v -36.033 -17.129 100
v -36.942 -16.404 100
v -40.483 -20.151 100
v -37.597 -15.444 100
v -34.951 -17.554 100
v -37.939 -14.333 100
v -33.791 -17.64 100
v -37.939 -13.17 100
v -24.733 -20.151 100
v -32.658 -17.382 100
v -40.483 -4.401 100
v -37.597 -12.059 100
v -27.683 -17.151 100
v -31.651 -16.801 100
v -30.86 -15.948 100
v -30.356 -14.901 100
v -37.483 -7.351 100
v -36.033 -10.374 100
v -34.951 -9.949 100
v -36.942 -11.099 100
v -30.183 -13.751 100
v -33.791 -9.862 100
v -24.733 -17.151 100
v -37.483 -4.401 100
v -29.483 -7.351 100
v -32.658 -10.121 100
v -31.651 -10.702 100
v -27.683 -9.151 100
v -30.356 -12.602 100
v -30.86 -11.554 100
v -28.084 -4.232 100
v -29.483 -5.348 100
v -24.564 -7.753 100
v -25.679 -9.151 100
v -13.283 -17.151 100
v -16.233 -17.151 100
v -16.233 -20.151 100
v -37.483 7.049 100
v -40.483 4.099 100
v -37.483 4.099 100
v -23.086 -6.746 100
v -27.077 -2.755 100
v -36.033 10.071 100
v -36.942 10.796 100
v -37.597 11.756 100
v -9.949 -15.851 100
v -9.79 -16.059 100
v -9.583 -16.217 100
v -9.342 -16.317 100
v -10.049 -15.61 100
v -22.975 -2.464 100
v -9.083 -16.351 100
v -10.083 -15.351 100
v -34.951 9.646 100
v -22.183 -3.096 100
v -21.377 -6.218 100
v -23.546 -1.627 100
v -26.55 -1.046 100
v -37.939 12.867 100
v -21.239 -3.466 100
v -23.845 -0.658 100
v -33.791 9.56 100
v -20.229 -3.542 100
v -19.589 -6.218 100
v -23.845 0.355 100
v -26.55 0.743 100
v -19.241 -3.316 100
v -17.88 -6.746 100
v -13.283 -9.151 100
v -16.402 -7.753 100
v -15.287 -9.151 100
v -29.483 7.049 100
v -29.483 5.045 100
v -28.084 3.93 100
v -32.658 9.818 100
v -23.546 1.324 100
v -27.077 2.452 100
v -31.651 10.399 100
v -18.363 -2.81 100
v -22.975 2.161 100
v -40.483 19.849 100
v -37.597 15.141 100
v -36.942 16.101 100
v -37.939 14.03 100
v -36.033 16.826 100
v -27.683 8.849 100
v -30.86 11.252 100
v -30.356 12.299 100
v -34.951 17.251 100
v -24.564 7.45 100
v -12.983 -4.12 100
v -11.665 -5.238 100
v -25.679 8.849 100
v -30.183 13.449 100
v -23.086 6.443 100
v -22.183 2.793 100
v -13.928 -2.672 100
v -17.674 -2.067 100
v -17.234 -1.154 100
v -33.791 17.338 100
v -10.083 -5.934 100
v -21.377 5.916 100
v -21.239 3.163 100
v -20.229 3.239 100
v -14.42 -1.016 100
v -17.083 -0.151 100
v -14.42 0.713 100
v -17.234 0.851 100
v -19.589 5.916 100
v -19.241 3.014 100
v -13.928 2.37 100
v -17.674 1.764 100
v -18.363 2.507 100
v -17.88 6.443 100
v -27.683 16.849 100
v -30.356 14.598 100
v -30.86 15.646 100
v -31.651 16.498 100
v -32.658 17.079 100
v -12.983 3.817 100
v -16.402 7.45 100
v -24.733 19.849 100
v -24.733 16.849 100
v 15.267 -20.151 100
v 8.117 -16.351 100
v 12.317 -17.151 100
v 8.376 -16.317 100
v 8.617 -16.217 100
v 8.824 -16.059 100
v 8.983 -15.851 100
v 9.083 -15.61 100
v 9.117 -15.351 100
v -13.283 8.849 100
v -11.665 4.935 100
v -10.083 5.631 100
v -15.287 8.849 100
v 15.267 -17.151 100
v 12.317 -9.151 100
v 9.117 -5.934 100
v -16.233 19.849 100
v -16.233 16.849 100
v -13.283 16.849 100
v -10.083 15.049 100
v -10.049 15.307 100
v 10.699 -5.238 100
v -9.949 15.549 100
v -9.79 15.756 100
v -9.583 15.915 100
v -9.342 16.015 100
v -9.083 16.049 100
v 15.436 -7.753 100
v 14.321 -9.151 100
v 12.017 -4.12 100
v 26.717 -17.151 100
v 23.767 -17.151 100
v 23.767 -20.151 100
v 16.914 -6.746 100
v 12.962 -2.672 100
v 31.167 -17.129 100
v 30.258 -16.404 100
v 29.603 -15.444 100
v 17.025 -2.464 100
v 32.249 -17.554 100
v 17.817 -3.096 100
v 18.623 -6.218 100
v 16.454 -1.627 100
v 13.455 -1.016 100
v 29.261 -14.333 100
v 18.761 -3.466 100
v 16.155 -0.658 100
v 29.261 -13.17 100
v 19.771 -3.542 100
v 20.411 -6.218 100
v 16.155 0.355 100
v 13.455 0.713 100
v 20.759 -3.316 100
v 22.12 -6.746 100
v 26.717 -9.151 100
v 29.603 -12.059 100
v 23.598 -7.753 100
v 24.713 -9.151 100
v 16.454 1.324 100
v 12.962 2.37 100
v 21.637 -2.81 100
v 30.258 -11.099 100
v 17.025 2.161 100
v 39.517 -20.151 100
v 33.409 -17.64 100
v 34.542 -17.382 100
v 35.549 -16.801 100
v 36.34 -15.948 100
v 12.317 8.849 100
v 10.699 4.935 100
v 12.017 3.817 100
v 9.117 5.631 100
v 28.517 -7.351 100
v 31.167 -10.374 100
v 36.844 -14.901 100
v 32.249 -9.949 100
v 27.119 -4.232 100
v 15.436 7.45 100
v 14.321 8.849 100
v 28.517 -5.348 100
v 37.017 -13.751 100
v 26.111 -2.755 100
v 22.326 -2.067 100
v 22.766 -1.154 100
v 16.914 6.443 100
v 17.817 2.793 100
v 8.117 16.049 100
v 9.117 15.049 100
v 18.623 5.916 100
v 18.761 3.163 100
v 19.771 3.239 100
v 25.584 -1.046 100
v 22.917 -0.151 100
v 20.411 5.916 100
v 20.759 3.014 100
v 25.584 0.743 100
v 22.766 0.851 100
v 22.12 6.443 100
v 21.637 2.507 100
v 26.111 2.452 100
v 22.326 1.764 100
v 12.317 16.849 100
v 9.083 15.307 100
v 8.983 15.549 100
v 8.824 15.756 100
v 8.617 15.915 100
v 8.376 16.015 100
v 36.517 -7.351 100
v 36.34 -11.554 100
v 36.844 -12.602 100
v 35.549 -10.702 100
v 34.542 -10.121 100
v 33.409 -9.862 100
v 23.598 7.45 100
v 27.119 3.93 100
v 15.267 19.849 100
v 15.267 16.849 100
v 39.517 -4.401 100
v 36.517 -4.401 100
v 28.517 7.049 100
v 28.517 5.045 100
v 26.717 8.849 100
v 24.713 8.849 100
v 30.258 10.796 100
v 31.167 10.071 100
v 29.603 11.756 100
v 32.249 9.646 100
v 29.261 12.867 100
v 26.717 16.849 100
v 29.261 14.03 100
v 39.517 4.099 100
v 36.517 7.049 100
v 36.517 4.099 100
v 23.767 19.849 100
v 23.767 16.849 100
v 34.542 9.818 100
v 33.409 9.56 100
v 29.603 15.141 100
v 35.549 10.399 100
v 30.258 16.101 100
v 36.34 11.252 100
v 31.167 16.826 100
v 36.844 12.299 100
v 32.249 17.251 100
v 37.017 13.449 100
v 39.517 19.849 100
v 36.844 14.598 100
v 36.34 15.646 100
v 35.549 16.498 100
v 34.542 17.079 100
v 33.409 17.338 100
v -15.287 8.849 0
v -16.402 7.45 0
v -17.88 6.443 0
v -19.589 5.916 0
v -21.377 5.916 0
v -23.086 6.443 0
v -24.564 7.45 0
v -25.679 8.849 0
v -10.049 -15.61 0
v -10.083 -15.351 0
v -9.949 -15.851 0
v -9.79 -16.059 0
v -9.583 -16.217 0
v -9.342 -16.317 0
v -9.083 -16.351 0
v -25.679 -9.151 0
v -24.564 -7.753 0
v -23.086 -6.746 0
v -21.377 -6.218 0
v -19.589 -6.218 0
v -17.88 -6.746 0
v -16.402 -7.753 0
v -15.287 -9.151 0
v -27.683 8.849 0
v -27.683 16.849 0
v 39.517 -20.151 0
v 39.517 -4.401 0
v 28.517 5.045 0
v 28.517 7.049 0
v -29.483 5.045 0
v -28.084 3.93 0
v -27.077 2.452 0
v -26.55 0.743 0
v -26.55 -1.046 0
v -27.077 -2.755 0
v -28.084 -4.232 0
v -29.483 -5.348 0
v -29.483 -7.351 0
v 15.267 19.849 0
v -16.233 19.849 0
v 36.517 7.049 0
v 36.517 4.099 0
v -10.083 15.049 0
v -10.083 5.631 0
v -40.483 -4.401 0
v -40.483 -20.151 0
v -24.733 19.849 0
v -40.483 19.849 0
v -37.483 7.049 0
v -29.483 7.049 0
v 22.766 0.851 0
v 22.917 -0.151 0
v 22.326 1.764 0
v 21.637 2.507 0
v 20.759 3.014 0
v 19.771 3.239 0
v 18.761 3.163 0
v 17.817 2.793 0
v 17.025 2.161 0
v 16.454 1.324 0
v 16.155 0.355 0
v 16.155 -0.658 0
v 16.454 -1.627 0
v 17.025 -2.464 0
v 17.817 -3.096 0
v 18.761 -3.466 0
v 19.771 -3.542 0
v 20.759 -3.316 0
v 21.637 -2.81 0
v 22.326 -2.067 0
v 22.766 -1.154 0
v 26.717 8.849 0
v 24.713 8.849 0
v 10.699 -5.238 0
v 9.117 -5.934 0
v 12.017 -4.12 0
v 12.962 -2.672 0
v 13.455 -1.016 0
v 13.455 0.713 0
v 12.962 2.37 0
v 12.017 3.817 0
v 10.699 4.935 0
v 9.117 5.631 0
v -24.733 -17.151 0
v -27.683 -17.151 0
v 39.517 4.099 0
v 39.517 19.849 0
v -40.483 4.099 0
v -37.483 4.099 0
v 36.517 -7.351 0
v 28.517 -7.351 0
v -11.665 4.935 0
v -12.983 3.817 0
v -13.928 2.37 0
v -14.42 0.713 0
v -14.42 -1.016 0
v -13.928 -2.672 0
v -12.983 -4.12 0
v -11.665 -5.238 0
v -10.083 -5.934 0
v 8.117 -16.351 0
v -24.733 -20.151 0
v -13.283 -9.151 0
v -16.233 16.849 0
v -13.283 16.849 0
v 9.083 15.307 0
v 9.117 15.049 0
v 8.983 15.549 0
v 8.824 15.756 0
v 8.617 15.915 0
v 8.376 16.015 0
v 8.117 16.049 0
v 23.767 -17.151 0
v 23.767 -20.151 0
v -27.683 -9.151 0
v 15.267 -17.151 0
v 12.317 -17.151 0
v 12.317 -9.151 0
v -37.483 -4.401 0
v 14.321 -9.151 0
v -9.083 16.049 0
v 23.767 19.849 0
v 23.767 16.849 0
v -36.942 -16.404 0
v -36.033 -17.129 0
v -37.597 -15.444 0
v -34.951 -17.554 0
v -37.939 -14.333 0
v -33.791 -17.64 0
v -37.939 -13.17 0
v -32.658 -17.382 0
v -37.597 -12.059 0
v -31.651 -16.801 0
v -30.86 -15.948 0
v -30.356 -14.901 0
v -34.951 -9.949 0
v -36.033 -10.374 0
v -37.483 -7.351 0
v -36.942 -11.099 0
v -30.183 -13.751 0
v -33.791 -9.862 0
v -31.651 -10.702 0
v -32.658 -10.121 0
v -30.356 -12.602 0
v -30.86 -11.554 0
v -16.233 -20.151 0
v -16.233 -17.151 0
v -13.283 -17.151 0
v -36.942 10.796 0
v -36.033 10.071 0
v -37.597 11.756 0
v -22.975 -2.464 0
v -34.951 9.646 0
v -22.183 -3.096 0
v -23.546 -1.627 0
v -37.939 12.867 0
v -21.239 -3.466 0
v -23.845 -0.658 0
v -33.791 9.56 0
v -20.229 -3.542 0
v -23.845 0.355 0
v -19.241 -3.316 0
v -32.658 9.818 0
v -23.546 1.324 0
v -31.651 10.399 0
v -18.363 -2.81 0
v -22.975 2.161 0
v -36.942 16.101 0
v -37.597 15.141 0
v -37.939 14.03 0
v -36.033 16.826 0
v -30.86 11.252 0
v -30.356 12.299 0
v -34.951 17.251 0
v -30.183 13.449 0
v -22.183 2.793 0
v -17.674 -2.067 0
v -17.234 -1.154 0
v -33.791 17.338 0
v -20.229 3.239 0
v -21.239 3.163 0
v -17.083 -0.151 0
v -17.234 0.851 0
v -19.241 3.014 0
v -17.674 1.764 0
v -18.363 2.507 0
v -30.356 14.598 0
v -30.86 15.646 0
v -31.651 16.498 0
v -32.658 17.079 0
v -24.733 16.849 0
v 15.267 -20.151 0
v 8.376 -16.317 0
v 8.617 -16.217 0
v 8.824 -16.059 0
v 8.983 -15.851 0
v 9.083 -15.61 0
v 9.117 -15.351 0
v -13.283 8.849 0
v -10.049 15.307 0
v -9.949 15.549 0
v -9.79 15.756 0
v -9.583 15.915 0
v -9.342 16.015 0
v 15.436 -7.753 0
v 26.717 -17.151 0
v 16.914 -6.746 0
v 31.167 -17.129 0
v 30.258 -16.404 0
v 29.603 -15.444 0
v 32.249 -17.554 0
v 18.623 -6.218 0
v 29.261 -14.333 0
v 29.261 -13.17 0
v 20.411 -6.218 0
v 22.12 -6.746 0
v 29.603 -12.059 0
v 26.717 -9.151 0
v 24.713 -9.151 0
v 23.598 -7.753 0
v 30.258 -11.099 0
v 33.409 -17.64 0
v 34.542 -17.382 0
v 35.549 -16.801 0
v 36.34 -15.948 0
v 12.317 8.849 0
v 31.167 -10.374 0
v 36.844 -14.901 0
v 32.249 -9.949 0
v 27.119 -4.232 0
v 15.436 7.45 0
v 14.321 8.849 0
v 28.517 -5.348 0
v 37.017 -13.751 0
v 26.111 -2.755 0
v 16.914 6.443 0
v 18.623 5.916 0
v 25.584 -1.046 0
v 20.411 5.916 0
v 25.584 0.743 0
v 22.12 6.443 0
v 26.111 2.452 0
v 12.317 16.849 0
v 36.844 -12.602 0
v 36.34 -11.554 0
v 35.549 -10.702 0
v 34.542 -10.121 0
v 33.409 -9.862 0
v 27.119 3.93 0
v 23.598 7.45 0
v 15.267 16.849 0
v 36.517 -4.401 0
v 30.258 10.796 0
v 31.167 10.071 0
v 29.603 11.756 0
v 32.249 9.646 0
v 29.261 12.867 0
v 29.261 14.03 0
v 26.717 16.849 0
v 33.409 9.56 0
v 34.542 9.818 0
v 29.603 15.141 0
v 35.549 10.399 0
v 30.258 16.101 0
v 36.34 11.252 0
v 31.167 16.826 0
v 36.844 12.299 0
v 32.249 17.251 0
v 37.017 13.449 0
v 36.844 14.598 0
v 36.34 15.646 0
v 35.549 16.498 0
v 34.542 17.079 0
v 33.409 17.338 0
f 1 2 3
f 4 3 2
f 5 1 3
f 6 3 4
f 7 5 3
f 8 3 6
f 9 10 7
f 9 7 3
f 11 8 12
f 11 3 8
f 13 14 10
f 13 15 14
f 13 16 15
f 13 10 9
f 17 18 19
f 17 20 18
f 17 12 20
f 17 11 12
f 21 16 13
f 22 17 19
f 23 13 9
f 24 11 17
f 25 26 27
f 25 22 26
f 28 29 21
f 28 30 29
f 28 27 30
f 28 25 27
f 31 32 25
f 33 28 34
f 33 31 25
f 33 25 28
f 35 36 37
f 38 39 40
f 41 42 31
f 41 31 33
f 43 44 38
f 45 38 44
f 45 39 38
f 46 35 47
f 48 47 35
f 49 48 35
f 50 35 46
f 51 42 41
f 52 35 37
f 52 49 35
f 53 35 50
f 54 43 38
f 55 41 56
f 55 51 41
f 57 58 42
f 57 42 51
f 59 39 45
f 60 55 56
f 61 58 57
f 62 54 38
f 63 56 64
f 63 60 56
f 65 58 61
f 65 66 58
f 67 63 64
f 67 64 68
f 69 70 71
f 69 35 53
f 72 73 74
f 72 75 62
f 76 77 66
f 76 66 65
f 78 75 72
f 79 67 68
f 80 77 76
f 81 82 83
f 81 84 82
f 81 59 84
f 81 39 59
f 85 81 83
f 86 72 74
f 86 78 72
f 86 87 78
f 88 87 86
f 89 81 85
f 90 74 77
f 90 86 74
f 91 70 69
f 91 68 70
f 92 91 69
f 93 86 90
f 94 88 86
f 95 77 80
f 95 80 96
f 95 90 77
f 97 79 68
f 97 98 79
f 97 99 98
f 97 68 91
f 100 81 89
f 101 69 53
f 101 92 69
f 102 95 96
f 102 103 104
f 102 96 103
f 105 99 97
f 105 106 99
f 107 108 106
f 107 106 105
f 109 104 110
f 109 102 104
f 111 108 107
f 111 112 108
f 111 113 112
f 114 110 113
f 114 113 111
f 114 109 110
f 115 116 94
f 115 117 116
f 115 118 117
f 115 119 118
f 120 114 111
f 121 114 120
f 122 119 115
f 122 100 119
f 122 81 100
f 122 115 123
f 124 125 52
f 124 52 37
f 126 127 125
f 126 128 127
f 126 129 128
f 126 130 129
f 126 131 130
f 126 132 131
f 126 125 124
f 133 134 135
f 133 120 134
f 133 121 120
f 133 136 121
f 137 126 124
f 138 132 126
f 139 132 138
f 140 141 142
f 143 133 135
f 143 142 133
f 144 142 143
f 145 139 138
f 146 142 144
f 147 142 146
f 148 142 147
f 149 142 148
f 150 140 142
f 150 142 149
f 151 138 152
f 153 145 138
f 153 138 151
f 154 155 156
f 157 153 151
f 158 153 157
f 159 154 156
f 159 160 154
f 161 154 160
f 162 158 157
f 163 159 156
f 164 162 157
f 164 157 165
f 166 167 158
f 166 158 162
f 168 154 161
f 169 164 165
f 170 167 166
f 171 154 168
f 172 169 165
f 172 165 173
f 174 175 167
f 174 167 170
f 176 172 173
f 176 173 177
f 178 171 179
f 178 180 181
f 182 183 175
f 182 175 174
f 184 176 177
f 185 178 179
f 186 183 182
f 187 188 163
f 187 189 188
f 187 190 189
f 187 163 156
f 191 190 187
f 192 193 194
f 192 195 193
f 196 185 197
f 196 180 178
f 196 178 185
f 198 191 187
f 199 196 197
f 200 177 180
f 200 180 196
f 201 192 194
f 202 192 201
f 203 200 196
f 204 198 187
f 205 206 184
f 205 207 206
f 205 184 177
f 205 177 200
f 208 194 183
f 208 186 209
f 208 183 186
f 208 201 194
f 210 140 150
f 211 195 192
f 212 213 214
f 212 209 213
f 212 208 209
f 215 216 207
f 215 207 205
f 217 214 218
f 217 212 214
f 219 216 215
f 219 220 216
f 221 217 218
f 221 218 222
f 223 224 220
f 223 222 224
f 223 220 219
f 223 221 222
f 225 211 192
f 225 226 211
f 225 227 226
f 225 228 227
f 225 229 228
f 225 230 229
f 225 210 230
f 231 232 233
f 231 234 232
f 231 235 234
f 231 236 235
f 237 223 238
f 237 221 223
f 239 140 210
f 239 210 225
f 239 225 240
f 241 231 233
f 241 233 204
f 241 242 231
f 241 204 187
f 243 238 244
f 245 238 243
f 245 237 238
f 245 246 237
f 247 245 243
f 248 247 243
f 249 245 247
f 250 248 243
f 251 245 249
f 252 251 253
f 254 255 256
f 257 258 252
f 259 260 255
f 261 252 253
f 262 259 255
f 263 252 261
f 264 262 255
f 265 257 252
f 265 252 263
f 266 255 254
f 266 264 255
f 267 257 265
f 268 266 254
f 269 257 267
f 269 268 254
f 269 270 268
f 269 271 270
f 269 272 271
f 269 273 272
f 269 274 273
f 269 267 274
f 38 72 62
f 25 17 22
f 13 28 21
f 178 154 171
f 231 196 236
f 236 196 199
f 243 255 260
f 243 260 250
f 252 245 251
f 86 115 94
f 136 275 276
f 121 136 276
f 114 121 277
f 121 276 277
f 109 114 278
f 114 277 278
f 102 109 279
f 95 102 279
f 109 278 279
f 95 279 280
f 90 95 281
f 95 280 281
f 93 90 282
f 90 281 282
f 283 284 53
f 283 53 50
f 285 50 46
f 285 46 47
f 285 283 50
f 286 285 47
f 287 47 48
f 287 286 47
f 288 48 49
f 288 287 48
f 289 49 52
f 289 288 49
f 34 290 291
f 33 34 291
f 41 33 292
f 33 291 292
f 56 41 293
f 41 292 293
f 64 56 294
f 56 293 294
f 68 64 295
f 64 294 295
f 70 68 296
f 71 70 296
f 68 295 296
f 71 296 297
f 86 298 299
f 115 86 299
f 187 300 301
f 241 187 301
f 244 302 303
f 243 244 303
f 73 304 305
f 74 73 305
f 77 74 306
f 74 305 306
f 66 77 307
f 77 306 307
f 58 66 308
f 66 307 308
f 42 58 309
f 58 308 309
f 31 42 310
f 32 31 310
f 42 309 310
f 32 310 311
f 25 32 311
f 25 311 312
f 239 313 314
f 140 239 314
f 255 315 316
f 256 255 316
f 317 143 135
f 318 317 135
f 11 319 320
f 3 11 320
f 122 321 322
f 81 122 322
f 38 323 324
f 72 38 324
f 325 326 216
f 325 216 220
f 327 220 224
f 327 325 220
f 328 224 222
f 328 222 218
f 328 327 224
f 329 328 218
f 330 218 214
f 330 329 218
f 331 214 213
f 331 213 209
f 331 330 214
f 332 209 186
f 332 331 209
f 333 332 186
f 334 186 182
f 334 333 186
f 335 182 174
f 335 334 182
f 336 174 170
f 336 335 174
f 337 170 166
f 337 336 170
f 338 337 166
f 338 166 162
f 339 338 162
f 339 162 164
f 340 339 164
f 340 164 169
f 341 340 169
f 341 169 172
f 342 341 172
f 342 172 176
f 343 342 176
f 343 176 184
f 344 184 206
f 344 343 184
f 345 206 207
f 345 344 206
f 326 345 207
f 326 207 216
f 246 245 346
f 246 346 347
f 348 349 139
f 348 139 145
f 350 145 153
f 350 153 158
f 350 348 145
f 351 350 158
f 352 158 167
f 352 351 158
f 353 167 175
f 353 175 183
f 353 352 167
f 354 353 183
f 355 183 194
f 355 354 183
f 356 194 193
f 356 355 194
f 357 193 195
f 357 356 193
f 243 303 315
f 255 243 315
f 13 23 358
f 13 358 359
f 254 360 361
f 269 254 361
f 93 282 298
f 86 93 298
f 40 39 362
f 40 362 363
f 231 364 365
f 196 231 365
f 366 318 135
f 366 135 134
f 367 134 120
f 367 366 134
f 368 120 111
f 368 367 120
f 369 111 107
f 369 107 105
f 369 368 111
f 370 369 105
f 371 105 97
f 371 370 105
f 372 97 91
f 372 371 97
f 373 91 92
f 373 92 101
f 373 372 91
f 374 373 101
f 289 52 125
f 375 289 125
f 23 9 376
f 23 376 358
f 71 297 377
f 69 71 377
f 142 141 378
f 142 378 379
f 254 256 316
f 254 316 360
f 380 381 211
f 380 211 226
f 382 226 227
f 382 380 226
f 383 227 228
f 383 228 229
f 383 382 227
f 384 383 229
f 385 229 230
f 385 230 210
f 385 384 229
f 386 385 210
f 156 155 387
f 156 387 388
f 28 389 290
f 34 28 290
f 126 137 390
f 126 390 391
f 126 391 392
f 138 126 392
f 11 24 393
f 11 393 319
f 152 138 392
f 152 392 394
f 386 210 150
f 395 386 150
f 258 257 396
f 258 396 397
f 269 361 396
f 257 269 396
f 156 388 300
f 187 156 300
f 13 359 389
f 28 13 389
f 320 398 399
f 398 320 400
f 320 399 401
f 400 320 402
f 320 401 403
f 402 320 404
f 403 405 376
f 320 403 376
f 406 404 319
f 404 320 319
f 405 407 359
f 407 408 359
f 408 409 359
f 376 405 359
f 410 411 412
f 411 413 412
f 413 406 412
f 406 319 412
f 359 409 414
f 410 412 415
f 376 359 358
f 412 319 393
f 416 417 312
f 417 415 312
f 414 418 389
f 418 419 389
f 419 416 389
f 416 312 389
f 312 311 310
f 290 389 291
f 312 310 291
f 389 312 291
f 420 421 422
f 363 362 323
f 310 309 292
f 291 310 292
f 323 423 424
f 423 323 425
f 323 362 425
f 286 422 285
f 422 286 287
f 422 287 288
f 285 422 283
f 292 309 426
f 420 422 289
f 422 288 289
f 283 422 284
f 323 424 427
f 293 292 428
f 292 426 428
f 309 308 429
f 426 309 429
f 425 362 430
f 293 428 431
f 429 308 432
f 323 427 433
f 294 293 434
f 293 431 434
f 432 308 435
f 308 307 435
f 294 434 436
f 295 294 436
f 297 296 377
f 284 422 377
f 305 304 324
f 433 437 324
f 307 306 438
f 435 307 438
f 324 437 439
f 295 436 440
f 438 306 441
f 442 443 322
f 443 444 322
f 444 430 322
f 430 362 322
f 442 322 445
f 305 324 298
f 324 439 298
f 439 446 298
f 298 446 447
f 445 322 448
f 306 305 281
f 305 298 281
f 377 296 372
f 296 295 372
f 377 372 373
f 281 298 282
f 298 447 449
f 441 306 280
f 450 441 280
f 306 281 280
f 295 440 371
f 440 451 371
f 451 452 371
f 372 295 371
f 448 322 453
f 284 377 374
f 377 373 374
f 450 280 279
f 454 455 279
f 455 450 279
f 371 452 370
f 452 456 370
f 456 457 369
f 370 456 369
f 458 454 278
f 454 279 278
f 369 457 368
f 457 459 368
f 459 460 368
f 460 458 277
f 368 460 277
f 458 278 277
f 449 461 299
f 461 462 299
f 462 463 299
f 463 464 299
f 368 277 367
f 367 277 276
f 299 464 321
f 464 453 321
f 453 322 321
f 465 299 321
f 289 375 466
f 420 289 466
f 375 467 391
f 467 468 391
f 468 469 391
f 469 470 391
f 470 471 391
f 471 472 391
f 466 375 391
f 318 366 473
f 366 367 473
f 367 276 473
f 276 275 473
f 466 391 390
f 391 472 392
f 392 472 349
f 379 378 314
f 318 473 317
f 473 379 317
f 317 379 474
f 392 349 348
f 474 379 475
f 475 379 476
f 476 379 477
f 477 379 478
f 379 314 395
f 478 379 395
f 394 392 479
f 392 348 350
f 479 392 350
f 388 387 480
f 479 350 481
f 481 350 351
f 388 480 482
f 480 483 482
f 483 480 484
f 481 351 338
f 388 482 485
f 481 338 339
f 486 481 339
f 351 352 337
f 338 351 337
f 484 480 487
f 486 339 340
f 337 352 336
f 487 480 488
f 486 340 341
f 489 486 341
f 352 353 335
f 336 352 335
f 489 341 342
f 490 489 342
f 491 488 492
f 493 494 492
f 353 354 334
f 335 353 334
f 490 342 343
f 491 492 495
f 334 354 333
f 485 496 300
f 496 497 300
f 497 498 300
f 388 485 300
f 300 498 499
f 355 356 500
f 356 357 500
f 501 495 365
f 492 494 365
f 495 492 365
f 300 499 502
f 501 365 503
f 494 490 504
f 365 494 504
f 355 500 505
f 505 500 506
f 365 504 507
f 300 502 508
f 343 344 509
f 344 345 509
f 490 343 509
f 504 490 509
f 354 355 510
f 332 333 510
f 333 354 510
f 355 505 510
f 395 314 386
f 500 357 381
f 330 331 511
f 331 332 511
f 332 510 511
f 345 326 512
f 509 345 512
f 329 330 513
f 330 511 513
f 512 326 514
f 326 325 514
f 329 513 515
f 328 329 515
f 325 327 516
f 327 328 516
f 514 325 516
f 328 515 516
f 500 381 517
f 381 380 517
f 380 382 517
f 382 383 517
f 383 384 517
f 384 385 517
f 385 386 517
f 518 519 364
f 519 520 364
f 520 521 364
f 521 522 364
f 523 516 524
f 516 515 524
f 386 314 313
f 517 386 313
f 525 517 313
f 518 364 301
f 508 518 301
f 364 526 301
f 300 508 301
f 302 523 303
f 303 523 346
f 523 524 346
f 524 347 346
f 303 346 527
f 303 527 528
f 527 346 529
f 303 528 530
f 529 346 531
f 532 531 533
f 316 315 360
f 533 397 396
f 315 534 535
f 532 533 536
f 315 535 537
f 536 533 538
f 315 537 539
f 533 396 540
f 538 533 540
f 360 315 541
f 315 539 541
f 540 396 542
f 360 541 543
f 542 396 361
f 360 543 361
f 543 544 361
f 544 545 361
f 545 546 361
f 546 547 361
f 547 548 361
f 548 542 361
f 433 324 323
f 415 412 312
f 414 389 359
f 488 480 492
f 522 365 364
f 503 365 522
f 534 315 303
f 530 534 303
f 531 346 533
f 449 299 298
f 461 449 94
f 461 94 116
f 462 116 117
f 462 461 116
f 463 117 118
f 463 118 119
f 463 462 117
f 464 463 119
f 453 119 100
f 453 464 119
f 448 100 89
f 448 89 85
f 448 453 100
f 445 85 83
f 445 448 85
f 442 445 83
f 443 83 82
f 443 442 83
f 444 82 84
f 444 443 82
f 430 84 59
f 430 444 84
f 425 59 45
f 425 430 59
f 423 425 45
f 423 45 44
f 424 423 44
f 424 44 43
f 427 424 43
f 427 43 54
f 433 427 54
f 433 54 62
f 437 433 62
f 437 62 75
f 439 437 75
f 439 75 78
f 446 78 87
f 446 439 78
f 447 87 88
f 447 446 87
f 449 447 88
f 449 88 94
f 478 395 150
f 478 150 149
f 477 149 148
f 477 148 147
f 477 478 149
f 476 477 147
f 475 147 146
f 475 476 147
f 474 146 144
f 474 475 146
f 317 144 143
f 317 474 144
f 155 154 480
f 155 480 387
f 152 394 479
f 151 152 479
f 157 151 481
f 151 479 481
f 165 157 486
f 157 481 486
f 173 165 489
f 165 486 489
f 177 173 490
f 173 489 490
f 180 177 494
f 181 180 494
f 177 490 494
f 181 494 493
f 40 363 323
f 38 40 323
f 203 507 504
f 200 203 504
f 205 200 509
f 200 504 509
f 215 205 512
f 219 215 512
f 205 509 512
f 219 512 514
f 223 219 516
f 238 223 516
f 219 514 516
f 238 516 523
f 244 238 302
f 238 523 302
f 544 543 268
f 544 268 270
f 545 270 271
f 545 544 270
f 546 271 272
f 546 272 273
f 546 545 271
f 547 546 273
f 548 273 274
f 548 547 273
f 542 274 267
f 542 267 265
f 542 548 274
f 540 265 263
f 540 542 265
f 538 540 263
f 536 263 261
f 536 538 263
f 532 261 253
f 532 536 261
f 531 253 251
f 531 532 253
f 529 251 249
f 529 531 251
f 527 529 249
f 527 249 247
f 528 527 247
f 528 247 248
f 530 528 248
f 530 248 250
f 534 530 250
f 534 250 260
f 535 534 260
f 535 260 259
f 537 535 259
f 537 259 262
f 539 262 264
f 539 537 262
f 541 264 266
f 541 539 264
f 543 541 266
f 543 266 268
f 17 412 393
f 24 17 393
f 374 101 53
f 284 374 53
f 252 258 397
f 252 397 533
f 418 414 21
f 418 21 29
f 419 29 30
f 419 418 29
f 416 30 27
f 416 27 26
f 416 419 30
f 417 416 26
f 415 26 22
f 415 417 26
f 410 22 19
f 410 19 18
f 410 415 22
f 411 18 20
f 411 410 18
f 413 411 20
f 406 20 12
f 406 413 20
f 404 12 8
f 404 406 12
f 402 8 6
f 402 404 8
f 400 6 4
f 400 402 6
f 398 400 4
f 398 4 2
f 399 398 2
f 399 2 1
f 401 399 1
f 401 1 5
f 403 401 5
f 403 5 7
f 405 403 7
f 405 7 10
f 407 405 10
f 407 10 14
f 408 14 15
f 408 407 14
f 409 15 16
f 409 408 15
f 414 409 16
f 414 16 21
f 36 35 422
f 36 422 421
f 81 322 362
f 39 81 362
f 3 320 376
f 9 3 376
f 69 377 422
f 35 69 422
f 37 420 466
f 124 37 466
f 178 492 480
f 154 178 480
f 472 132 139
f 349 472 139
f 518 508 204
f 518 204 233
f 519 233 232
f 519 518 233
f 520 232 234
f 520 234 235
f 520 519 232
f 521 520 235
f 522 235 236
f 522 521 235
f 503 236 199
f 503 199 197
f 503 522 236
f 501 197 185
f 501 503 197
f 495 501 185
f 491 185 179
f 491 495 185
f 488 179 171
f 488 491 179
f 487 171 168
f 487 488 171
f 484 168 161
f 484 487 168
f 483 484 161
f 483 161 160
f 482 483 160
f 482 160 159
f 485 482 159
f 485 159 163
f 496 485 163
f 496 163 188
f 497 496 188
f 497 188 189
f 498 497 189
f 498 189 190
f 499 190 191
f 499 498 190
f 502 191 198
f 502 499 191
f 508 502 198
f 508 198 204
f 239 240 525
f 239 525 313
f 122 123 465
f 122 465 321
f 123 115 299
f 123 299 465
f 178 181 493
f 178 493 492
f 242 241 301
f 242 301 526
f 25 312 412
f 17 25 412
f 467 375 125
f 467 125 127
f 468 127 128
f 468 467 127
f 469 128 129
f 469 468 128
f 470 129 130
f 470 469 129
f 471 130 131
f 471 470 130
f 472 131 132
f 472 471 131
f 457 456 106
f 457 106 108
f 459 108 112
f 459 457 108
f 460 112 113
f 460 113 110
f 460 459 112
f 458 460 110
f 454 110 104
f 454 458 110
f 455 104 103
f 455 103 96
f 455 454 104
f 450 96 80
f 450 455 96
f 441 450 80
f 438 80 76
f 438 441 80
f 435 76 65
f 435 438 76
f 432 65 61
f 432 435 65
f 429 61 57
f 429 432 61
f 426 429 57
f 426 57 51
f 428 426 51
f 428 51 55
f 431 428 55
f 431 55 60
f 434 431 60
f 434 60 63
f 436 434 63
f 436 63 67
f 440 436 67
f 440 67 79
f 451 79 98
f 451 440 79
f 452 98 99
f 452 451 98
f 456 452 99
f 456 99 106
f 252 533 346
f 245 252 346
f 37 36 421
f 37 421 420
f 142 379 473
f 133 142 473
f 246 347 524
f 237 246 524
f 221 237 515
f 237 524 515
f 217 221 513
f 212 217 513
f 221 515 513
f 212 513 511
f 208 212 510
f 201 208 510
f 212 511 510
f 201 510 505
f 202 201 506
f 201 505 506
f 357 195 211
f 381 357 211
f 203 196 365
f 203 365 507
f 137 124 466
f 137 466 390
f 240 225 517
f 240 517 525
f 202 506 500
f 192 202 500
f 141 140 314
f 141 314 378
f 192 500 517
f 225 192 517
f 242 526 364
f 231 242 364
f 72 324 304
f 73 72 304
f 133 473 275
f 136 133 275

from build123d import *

# Parameters (mm, degrees)
SKETCH_1_R      = 3.9
SKETCH_1_R_2    = 3.4
EXTRUDE_1_DEPTH = 100


with BuildPart() as part:
    # 草图1 → 凸台-拉伸1 (new body)
    with BuildSketch(Plane.XY):
        with BuildLine():
            Line((-24.732808051, 19.848597475), (-40.482808051, 19.848597475))
            Line((-40.482808051, 19.848597475), (-40.482808051, 4.098597475))
            Line((-40.482808051, 4.098597475), (-37.482808051, 4.098597475))
            Line((-37.482808051, 4.098597475), (-37.482808051, 7.048597475))
            Line((-37.482808051, 7.048597475), (-29.482808051, 7.048597475))
            Line((-29.482808051, 7.048597475), (-29.482808051, 5.044749898))
            ThreePointArc((-29.482808051, 5.044749898), (-26.482808051, -0.151402525), (-29.482808051, -5.347554947))
            Line((-29.482808051, -5.347554947), (-29.482808051, -7.351402525))
            Line((-29.482808051, -7.351402525), (-37.482808051, -7.351402525))
            Line((-37.482808051, -7.351402525), (-37.482808051, -4.401402525))
            Line((-37.482808051, -4.401402525), (-40.482808051, -4.401402525))
            Line((-40.482808051, -4.401402525), (-40.482808051, -20.151402525))
            Line((-40.482808051, -20.151402525), (-24.732808051, -20.151402525))
            Line((-24.732808051, -20.151402525), (-24.732808051, -17.151402525))
            Line((-24.732808051, -17.151402525), (-27.682808051, -17.151402525))
            Line((-27.682808051, -17.151402525), (-27.682808051, -9.151402525))
            Line((-27.682808051, -9.151402525), (-25.678960473, -9.151402525))
            ThreePointArc((-25.678960473, -9.151402525), (-20.482808051, -6.151402525), (-15.286655628, -9.151402525))
            Line((-15.286655628, -9.151402525), (-13.282808051, -9.151402525))
            Line((-13.282808051, -9.151402525), (-13.282808051, -17.151402525))
            Line((-13.282808051, -17.151402525), (-16.232808051, -17.151402525))
            Line((-16.232808051, -17.151402525), (-16.232808051, -20.151402525))
            Line((-16.232808051, -20.151402525), (-0.482808051, -20.151402525))
            Line((-0.482808051, -20.151402525), (15.267191949, -20.151402525))
            Line((15.267191949, -20.151402525), (15.267191949, -17.151402525))
            Line((15.267191949, -17.151402525), (12.317191949, -17.151402525))
            Line((12.317191949, -17.151402525), (12.317191949, -9.151402525))
            Line((12.317191949, -9.151402525), (14.321039527, -9.151402525))
            ThreePointArc((14.321039527, -9.151402525), (19.517191949, -6.151402525), (24.713344372, -9.151402525))
            Line((24.713344372, -9.151402525), (26.717191949, -9.151402525))
            Line((26.717191949, -9.151402525), (26.717191949, -17.151402525))
            Line((26.717191949, -17.151402525), (23.767191949, -17.151402525))
            Line((23.767191949, -17.151402525), (23.767191949, -20.151402525))
            Line((23.767191949, -20.151402525), (39.517191949, -20.151402525))
            Line((39.517191949, -20.151402525), (39.517191949, -4.401402525))
            Line((39.517191949, -4.401402525), (36.517191949, -4.401402525))
            Line((36.517191949, -4.401402525), (36.517191949, -7.351402525))
            Line((36.517191949, -7.351402525), (28.517191949, -7.351402525))
            Line((28.517191949, -7.351402525), (28.517191949, -5.347554947))
            ThreePointArc((28.517191949, -5.347554947), (25.517191949, -0.151402525), (28.517191949, 5.044749898))
            Line((28.517191949, 5.044749898), (28.517191949, 7.048597475))
            Line((28.517191949, 7.048597475), (36.517191949, 7.048597475))
            Line((36.517191949, 7.048597475), (36.517191949, 4.098597475))
            Line((36.517191949, 4.098597475), (39.517191949, 4.098597475))
            Line((39.517191949, 4.098597475), (39.517191949, 19.848597475))
            Line((39.517191949, 19.848597475), (23.767191949, 19.848597475))
            Line((23.767191949, 19.848597475), (23.767191949, 16.848597475))
            Line((23.767191949, 16.848597475), (26.717191949, 16.848597475))
            Line((26.717191949, 16.848597475), (26.717191949, 8.848597475))
            Line((26.717191949, 8.848597475), (24.713344372, 8.848597475))
            ThreePointArc((24.713344372, 8.848597475), (19.517191949, 5.848597475), (14.321039527, 8.848597475))
            Line((14.321039527, 8.848597475), (12.317191949, 8.848597475))
            Line((12.317191949, 8.848597475), (12.317191949, 16.848597475))
            Line((12.317191949, 16.848597475), (15.267191949, 16.848597475))
            Line((15.267191949, 16.848597475), (15.267191949, 19.848597475))
            Line((15.267191949, 19.848597475), (-0.482808051, 19.848597475))
            Line((-0.482808051, 19.848597475), (-16.232808051, 19.848597475))
            Line((-16.232808051, 19.848597475), (-16.232808051, 16.848597475))
            Line((-16.232808051, 16.848597475), (-13.282808051, 16.848597475))
            Line((-13.282808051, 16.848597475), (-13.282808051, 8.848597475))
            Line((-13.282808051, 8.848597475), (-15.286655628, 8.848597475))
            ThreePointArc((-15.286655628, 8.848597475), (-20.482808051, 5.848597475), (-25.678960473, 8.848597475))
            Line((-25.678960473, 8.848597475), (-27.682808051, 8.848597475))
            Line((-27.682808051, 8.848597475), (-27.682808051, 16.848597475))
            Line((-27.682808051, 16.848597475), (-24.732808051, 16.848597475))
            Line((-24.732808051, 16.848597475), (-24.732808051, 19.848597475))
        make_face()
        with Locations((-34.082808051, 13.448597475)):
            Circle(SKETCH_1_R, mode=Mode.SUBTRACT)
        with Locations((-34.082808051, -13.751402525)):
            Circle(SKETCH_1_R, mode=Mode.SUBTRACT)
        with Locations((-20.482808051, -0.151402525)):
            Circle(SKETCH_1_R_2, mode=Mode.SUBTRACT)
        with Locations((33.117191949, 13.448597475)):
            Circle(SKETCH_1_R, mode=Mode.SUBTRACT)
        with Locations((33.117191949, -13.751402525)):
            Circle(SKETCH_1_R, mode=Mode.SUBTRACT)
        with Locations((19.517191949, -0.151402525)):
            Circle(SKETCH_1_R_2, mode=Mode.SUBTRACT)
        with BuildLine():
            Line((-10.082808051, 15.048597475), (-10.082808051, 5.631330393))
            ThreePointArc((-10.082808051, 5.631330393), (-14.482808051, -0.151402525), (-10.082808051, -5.934135442))
            Line((-10.082808051, -5.934135442), (-10.082808051, -15.351402525))
            ThreePointArc((-10.082808051, -15.351402525), (-9.789914832, -16.058509306), (-9.082808051, -16.351402525))
            Line((-9.082808051, -16.351402525), (8.117191949, -16.351402525))
            ThreePointArc((8.117191949, -16.351402525), (8.824298731, -16.058509306), (9.117191949, -15.351402525))
            Line((9.117191949, -15.351402525), (9.117191949, -5.934135442))
            ThreePointArc((9.117191949, -5.934135442), (13.517191949, -0.151402525), (9.117191949, 5.631330393))
            Line((9.117191949, 5.631330393), (9.117191949, 15.048597475))
            ThreePointArc((9.117191949, 15.048597475), (8.824298731, 15.755704257), (8.117191949, 16.048597475))
            Line((8.117191949, 16.048597475), (-9.082808051, 16.048597475))
            ThreePointArc((-9.082808051, 16.048597475), (-9.789914832, 15.755704257), (-10.082808051, 15.048597475))
        make_face(mode=Mode.SUBTRACT)
    extrude(amount=EXTRUDE_1_DEPTH)


solid = part.part
